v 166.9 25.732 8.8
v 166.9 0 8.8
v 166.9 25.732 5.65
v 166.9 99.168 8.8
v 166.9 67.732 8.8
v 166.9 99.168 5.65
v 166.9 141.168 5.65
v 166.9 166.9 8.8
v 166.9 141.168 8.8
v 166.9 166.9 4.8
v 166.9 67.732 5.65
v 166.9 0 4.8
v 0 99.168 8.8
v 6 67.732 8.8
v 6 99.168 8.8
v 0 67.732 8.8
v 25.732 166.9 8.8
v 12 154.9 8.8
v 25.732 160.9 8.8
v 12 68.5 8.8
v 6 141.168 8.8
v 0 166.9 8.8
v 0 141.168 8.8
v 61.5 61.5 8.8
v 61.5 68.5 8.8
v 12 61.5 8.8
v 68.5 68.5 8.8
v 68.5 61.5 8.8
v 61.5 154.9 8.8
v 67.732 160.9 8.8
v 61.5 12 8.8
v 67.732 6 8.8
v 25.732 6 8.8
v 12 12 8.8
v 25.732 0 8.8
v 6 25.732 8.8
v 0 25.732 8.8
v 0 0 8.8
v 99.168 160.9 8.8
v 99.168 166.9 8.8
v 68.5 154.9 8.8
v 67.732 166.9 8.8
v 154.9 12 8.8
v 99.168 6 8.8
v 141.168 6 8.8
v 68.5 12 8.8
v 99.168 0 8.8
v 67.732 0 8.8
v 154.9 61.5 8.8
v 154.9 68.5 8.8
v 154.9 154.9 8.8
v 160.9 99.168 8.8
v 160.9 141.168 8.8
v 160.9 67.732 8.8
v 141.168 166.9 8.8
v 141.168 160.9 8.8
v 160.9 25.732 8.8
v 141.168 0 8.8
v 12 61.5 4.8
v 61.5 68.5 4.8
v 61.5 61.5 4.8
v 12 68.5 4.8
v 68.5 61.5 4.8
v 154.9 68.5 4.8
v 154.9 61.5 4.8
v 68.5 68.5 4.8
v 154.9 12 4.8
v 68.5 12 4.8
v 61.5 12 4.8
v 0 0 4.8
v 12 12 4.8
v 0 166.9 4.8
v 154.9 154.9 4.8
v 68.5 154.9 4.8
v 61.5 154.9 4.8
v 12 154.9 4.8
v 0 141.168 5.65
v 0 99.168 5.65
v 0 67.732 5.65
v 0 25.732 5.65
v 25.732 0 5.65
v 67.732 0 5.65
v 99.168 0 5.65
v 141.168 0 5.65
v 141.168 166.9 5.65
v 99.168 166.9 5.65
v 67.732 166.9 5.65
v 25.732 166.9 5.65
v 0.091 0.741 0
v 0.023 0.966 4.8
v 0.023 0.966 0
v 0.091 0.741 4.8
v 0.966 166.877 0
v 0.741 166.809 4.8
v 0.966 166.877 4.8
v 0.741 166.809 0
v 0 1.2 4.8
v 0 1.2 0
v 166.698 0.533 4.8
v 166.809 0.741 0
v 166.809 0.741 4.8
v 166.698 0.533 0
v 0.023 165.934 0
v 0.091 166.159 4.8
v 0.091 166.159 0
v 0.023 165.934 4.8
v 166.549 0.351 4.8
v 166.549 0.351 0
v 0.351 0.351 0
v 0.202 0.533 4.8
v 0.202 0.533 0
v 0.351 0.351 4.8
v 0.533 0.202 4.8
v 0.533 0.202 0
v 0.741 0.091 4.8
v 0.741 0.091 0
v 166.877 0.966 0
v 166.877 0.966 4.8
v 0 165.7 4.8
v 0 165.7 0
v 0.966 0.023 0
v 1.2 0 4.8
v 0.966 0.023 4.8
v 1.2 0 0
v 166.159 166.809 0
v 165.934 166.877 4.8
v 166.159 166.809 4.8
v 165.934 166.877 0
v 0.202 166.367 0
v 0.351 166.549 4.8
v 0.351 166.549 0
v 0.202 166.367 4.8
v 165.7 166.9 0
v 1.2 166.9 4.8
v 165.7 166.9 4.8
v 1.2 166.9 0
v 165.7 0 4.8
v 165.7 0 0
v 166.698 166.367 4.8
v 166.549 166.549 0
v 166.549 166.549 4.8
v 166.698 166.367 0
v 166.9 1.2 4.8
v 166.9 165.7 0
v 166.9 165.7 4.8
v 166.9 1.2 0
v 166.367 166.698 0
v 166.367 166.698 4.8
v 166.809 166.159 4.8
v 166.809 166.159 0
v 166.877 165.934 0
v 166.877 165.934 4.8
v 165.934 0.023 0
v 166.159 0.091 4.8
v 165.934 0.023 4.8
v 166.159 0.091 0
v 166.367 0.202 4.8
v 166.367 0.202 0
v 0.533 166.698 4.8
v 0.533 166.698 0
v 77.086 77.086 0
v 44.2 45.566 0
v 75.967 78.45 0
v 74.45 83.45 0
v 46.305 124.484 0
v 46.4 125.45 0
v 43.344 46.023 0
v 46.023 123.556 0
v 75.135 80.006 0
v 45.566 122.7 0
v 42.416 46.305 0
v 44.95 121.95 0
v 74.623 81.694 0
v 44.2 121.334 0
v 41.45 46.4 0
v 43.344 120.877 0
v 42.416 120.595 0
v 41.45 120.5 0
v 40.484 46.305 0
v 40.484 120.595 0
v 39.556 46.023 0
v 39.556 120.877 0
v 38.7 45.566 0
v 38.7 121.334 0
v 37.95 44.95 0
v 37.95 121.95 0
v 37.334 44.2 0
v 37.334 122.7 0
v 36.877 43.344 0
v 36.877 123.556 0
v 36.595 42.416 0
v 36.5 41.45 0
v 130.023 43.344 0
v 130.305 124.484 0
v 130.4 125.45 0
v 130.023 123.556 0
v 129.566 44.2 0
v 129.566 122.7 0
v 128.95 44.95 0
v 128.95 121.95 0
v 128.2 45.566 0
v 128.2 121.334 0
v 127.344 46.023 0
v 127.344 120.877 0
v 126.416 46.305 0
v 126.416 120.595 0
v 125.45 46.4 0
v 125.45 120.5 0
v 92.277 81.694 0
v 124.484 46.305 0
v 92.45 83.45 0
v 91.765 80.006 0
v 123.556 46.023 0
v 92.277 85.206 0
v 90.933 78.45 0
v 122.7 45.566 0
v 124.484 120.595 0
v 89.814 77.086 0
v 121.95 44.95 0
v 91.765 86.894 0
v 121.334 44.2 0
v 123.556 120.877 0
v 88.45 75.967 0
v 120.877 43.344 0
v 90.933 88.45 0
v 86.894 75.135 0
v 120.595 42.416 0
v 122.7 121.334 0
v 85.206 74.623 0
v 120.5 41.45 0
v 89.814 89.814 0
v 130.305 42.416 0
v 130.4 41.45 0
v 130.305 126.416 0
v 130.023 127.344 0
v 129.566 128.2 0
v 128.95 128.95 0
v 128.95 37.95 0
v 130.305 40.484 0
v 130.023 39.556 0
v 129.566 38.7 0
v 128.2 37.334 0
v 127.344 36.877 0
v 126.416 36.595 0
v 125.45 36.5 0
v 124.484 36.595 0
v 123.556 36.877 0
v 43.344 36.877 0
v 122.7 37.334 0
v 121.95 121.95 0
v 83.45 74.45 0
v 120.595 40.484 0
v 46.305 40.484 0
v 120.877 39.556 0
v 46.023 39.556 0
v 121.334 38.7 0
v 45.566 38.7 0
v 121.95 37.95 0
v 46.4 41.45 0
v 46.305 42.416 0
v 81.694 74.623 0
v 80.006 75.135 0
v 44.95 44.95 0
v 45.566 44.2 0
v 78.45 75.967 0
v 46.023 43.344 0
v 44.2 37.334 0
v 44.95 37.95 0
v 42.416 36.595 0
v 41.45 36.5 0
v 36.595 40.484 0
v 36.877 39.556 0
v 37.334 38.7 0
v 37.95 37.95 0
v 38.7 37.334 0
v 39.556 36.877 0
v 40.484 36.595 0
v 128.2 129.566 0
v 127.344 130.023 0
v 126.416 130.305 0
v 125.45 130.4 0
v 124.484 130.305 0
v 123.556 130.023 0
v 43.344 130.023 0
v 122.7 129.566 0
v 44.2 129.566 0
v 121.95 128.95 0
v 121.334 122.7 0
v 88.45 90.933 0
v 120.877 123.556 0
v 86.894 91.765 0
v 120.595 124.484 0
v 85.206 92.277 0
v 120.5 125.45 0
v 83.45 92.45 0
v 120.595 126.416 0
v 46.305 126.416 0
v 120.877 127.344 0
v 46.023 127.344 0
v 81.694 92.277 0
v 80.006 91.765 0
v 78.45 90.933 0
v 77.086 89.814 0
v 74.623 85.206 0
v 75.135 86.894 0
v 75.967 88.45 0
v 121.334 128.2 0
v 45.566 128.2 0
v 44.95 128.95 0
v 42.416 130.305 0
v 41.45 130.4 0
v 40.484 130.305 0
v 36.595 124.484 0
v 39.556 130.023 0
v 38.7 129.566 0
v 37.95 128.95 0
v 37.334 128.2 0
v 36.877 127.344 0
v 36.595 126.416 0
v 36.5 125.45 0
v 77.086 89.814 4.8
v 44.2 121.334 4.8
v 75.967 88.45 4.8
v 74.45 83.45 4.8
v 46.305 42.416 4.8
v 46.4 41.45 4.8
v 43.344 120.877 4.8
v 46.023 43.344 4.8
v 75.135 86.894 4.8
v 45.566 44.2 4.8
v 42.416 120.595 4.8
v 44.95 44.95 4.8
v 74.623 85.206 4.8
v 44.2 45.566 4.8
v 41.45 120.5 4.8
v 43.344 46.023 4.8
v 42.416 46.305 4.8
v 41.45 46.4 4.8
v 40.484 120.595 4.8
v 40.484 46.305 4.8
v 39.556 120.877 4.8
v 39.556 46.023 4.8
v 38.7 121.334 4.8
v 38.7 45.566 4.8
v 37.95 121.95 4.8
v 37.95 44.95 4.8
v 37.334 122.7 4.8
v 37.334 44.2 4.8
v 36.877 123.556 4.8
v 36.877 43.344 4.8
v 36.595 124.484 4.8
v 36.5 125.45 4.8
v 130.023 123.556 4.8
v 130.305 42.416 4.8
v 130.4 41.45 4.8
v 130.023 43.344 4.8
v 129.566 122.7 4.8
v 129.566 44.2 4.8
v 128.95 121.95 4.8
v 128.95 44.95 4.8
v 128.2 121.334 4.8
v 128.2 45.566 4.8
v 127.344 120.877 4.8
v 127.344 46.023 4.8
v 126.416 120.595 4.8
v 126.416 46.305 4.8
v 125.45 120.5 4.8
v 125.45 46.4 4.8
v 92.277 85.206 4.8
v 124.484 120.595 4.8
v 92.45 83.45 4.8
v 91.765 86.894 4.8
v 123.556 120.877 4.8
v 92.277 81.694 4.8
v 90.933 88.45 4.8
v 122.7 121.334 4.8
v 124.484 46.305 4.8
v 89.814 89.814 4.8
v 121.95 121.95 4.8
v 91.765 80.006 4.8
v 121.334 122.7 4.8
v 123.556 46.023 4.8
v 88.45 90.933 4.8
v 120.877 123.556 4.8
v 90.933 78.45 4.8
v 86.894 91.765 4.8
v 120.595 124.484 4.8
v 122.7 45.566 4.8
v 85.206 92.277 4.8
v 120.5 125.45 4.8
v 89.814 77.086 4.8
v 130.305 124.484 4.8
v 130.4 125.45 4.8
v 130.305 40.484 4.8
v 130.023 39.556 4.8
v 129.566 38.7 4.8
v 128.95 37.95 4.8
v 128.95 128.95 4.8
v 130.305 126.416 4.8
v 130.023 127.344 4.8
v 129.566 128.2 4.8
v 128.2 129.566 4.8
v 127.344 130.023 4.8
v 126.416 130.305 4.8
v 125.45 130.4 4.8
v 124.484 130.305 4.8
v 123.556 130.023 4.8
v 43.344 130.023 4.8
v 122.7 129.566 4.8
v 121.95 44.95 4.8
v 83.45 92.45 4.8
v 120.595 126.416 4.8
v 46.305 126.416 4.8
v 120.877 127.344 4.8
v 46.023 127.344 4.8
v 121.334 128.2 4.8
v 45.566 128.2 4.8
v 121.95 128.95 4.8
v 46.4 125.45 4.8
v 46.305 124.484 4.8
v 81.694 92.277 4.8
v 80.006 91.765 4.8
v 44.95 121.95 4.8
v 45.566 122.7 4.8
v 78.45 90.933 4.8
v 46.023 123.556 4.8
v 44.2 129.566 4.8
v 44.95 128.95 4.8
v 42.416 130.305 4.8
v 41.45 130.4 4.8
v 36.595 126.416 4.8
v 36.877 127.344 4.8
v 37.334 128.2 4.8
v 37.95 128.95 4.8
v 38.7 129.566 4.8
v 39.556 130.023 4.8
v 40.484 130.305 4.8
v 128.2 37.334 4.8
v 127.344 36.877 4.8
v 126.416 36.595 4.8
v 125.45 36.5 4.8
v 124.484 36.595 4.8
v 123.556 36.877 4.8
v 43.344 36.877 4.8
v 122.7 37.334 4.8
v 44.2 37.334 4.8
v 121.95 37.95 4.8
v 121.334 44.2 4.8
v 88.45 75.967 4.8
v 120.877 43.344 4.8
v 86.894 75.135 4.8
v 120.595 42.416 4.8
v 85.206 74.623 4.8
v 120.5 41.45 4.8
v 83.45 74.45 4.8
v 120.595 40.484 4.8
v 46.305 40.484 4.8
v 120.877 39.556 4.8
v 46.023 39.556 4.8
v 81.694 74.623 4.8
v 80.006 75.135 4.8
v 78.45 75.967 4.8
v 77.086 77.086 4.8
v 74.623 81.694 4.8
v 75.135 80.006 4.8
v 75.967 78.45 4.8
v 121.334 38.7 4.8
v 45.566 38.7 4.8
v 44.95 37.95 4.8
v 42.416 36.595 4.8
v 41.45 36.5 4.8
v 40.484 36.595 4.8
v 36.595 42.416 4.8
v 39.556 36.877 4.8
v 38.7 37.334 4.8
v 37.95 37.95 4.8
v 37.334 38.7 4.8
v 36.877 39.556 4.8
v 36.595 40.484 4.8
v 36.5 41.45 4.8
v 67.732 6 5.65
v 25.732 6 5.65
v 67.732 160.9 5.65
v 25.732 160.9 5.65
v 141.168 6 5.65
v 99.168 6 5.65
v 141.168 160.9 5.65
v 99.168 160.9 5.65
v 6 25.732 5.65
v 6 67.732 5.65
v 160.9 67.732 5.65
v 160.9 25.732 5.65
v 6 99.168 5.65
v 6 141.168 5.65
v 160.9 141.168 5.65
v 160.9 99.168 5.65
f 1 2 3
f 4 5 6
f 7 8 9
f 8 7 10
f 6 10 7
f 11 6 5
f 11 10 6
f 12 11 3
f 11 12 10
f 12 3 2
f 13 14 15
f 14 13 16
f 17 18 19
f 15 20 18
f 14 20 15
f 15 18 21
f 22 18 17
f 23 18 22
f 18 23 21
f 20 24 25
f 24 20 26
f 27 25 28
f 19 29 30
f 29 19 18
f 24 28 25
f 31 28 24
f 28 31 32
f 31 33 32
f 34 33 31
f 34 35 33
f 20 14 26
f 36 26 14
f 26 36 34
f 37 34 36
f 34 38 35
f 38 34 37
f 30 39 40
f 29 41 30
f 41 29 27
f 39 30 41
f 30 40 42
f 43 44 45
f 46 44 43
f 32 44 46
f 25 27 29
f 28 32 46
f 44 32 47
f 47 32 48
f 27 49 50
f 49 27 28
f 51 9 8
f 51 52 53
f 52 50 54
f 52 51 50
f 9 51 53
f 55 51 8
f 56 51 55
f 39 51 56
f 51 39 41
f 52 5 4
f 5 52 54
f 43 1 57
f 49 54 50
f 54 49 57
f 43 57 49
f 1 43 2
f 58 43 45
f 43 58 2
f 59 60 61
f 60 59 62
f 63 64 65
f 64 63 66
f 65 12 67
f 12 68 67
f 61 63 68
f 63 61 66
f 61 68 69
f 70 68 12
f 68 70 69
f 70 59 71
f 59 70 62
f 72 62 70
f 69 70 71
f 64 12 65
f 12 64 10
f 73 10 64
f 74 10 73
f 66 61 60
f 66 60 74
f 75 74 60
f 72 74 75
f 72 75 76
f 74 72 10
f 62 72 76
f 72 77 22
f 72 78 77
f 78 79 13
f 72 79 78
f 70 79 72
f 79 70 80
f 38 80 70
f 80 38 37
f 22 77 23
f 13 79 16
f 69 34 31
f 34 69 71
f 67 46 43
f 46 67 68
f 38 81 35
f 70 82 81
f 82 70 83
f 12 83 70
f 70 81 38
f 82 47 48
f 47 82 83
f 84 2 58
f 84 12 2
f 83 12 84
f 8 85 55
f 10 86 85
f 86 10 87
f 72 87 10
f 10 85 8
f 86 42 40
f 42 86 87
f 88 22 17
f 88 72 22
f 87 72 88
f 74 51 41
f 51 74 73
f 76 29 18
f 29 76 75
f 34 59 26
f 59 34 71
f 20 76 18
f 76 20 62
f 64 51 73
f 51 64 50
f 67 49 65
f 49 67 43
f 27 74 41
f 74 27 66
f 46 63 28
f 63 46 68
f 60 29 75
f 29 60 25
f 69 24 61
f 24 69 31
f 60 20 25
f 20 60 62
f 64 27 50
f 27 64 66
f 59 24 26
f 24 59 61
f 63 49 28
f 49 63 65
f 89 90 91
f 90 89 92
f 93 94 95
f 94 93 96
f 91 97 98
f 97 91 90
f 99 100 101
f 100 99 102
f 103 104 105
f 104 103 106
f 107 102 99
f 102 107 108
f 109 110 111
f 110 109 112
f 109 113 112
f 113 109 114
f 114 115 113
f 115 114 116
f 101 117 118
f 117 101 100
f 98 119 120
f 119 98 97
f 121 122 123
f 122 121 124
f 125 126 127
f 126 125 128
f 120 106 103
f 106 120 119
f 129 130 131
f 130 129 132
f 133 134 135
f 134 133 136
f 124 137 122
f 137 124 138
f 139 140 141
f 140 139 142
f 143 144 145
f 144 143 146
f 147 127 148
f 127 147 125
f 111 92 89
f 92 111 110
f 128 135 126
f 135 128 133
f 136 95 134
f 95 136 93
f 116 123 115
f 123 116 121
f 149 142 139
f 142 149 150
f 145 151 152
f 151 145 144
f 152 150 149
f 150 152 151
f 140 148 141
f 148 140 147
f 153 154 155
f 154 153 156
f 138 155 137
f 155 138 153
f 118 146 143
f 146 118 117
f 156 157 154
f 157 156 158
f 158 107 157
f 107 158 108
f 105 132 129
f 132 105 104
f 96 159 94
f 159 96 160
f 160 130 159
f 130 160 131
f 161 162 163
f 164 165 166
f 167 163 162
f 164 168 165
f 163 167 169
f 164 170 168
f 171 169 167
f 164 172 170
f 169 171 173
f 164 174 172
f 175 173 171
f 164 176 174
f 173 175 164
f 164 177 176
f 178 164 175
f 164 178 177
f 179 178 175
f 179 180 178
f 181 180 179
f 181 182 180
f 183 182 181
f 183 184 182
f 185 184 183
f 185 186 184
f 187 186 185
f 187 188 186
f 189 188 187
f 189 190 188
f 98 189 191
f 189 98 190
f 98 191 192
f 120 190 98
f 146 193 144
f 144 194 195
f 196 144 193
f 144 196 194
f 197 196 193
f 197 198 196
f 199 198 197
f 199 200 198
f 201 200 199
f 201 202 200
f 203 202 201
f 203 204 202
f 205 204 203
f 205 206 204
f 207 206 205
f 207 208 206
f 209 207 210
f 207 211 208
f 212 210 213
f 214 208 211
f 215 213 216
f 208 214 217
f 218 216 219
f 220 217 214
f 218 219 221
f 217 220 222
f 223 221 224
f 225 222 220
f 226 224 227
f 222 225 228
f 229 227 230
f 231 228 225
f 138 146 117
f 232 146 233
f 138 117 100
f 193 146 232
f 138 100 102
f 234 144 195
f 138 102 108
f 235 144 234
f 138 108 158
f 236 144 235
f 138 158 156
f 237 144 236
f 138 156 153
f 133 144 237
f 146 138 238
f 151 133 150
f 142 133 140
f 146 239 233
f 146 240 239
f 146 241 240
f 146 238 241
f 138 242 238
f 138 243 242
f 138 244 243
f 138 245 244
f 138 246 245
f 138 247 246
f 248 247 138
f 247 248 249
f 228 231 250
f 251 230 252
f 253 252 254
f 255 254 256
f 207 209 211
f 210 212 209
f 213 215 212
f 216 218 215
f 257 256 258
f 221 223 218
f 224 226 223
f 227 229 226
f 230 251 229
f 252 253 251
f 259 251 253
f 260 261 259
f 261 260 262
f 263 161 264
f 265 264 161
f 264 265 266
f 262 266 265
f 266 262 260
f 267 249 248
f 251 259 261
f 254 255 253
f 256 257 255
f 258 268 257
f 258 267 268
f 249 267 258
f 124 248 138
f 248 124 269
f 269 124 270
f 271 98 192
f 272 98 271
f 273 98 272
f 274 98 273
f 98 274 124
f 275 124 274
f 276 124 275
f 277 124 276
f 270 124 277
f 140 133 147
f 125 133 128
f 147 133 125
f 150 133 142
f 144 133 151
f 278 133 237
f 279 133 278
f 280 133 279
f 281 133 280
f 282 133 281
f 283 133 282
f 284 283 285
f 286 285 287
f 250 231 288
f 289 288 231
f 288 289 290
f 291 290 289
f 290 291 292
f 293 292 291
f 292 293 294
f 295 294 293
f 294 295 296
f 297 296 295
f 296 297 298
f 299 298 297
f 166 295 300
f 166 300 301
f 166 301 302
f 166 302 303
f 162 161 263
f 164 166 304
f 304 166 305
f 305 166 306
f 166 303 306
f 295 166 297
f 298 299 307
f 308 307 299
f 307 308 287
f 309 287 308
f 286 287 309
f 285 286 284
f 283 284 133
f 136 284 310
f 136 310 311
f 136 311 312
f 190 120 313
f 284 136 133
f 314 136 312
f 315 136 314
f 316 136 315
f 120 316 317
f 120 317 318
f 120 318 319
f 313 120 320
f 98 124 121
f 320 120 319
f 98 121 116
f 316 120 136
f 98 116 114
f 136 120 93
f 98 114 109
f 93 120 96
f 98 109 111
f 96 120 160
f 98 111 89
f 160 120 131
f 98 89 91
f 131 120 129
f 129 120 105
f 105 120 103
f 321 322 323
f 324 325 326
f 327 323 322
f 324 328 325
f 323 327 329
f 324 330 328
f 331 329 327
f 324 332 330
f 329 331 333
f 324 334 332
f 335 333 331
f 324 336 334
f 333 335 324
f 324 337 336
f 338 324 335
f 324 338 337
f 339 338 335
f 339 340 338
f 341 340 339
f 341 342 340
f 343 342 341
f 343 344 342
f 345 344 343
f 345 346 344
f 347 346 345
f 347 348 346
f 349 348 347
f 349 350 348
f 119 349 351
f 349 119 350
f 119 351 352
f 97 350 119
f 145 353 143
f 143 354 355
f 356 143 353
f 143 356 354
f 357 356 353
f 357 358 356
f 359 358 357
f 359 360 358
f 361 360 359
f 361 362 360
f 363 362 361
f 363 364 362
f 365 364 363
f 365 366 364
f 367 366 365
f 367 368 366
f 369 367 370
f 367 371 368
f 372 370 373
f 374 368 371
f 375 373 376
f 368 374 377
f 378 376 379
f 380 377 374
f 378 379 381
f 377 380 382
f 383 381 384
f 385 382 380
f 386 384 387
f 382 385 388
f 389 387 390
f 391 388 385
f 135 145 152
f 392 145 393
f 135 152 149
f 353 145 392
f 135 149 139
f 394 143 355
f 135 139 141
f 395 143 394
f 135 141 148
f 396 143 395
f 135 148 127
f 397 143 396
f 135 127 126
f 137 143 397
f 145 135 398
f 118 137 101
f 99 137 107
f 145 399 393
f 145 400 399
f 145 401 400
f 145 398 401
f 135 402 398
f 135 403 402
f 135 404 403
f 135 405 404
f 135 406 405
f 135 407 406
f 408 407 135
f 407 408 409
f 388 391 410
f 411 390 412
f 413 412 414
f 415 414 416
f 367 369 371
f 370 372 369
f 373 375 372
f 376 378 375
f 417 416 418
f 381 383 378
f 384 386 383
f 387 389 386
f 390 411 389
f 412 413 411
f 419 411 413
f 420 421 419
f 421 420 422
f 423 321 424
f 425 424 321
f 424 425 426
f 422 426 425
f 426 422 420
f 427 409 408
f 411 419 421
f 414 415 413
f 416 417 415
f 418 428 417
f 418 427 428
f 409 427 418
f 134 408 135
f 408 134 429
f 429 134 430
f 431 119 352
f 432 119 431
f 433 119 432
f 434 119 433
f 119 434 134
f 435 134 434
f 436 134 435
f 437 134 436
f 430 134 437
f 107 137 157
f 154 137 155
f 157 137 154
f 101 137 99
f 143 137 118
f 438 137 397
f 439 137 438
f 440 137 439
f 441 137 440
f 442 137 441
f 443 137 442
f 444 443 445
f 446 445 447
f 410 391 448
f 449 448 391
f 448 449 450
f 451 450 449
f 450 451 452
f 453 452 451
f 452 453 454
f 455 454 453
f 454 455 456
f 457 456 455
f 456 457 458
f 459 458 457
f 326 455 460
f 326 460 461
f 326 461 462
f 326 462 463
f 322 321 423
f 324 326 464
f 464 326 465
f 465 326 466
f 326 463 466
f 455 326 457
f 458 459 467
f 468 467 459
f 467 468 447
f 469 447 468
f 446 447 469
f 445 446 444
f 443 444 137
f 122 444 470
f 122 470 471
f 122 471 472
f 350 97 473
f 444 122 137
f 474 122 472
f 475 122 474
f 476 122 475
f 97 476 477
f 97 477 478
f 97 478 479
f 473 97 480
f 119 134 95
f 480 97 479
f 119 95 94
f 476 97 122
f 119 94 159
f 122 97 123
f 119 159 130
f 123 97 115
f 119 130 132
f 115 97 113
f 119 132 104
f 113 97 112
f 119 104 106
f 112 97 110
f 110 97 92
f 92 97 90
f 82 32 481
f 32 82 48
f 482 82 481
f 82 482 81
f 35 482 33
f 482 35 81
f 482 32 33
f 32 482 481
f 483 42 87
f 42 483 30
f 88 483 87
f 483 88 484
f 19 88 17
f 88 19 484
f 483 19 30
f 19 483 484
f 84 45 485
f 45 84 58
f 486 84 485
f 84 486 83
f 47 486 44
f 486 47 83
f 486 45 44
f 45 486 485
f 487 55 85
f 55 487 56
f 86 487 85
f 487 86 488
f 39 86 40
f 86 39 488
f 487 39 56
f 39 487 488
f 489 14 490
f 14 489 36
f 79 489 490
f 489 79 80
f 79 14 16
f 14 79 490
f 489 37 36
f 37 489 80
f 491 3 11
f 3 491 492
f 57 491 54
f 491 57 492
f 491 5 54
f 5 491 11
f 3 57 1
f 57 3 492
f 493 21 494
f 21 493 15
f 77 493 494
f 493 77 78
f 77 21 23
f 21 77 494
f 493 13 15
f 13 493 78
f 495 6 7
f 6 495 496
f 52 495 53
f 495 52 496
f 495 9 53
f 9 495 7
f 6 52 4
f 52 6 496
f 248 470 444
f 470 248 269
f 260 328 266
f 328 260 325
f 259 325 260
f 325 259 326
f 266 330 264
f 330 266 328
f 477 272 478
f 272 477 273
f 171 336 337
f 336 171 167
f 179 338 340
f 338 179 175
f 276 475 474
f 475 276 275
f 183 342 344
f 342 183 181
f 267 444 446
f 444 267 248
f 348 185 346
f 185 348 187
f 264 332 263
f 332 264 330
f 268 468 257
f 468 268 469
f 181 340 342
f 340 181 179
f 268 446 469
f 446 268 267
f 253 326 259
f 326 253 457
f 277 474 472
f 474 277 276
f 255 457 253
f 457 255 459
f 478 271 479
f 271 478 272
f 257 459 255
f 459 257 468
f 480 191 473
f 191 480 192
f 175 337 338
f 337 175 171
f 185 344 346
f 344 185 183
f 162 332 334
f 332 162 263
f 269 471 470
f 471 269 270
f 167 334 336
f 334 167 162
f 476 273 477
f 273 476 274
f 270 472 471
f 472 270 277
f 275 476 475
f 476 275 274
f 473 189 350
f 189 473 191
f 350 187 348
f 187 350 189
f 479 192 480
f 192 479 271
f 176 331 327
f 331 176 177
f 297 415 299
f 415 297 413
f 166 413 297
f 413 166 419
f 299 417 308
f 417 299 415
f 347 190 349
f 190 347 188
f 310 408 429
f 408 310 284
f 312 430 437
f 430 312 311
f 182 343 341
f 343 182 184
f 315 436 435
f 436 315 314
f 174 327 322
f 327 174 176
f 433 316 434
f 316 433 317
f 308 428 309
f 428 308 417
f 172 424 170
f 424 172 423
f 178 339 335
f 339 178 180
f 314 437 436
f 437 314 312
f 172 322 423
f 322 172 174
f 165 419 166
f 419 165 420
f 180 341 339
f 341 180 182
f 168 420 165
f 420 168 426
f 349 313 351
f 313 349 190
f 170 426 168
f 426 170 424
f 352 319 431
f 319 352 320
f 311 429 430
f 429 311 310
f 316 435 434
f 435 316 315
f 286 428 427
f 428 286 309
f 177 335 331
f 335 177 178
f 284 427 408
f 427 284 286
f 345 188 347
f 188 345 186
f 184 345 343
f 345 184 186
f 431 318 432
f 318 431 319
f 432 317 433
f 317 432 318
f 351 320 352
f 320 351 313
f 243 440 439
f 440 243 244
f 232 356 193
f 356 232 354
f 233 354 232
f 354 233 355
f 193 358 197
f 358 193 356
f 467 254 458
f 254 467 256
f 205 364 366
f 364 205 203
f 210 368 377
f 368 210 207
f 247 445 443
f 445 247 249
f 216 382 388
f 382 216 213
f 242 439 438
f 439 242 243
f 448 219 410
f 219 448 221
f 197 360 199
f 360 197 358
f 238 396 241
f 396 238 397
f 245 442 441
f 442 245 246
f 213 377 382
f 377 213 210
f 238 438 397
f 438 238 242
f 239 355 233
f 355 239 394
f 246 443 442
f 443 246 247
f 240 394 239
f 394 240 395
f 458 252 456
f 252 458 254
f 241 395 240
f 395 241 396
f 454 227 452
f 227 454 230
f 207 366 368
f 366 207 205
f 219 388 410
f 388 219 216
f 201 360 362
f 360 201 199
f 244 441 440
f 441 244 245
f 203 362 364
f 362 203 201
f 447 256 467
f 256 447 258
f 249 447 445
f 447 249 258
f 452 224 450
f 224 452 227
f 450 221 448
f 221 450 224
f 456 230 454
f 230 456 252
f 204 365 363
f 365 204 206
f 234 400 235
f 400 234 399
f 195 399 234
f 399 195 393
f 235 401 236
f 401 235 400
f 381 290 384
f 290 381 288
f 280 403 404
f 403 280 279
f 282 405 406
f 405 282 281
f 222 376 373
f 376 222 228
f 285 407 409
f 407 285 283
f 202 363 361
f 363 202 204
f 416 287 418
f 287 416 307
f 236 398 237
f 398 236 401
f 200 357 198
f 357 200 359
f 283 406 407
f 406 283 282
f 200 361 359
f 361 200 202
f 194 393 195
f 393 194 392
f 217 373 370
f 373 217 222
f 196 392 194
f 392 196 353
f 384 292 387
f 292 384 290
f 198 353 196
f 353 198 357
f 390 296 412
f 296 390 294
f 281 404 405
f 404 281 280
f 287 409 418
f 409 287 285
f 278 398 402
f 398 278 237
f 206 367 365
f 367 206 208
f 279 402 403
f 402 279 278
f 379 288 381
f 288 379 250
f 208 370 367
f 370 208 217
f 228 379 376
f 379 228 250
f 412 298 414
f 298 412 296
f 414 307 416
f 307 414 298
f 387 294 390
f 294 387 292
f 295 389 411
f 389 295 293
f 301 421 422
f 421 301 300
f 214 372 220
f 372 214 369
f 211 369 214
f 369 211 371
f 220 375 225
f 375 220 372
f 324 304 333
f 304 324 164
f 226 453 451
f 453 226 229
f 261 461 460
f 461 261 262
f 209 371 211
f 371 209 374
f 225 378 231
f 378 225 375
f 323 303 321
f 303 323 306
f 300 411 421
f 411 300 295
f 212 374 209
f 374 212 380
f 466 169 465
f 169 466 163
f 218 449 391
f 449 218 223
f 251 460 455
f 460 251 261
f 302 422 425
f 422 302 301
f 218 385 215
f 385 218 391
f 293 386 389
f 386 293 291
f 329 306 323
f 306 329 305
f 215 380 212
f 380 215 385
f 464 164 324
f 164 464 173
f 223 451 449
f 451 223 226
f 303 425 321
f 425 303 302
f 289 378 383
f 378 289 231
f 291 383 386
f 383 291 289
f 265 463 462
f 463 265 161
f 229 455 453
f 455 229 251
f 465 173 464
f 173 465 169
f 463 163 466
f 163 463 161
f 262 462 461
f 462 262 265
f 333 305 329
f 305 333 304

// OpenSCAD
/*
Bottom outer skin tile with through drain holes.
Print orientation: large underside face on the bed, ribs and key recesses upward.
Quantity: one per bottom grid position.
*/

use <../planter_support_free.scad>

export_bottom_outer_tile();
